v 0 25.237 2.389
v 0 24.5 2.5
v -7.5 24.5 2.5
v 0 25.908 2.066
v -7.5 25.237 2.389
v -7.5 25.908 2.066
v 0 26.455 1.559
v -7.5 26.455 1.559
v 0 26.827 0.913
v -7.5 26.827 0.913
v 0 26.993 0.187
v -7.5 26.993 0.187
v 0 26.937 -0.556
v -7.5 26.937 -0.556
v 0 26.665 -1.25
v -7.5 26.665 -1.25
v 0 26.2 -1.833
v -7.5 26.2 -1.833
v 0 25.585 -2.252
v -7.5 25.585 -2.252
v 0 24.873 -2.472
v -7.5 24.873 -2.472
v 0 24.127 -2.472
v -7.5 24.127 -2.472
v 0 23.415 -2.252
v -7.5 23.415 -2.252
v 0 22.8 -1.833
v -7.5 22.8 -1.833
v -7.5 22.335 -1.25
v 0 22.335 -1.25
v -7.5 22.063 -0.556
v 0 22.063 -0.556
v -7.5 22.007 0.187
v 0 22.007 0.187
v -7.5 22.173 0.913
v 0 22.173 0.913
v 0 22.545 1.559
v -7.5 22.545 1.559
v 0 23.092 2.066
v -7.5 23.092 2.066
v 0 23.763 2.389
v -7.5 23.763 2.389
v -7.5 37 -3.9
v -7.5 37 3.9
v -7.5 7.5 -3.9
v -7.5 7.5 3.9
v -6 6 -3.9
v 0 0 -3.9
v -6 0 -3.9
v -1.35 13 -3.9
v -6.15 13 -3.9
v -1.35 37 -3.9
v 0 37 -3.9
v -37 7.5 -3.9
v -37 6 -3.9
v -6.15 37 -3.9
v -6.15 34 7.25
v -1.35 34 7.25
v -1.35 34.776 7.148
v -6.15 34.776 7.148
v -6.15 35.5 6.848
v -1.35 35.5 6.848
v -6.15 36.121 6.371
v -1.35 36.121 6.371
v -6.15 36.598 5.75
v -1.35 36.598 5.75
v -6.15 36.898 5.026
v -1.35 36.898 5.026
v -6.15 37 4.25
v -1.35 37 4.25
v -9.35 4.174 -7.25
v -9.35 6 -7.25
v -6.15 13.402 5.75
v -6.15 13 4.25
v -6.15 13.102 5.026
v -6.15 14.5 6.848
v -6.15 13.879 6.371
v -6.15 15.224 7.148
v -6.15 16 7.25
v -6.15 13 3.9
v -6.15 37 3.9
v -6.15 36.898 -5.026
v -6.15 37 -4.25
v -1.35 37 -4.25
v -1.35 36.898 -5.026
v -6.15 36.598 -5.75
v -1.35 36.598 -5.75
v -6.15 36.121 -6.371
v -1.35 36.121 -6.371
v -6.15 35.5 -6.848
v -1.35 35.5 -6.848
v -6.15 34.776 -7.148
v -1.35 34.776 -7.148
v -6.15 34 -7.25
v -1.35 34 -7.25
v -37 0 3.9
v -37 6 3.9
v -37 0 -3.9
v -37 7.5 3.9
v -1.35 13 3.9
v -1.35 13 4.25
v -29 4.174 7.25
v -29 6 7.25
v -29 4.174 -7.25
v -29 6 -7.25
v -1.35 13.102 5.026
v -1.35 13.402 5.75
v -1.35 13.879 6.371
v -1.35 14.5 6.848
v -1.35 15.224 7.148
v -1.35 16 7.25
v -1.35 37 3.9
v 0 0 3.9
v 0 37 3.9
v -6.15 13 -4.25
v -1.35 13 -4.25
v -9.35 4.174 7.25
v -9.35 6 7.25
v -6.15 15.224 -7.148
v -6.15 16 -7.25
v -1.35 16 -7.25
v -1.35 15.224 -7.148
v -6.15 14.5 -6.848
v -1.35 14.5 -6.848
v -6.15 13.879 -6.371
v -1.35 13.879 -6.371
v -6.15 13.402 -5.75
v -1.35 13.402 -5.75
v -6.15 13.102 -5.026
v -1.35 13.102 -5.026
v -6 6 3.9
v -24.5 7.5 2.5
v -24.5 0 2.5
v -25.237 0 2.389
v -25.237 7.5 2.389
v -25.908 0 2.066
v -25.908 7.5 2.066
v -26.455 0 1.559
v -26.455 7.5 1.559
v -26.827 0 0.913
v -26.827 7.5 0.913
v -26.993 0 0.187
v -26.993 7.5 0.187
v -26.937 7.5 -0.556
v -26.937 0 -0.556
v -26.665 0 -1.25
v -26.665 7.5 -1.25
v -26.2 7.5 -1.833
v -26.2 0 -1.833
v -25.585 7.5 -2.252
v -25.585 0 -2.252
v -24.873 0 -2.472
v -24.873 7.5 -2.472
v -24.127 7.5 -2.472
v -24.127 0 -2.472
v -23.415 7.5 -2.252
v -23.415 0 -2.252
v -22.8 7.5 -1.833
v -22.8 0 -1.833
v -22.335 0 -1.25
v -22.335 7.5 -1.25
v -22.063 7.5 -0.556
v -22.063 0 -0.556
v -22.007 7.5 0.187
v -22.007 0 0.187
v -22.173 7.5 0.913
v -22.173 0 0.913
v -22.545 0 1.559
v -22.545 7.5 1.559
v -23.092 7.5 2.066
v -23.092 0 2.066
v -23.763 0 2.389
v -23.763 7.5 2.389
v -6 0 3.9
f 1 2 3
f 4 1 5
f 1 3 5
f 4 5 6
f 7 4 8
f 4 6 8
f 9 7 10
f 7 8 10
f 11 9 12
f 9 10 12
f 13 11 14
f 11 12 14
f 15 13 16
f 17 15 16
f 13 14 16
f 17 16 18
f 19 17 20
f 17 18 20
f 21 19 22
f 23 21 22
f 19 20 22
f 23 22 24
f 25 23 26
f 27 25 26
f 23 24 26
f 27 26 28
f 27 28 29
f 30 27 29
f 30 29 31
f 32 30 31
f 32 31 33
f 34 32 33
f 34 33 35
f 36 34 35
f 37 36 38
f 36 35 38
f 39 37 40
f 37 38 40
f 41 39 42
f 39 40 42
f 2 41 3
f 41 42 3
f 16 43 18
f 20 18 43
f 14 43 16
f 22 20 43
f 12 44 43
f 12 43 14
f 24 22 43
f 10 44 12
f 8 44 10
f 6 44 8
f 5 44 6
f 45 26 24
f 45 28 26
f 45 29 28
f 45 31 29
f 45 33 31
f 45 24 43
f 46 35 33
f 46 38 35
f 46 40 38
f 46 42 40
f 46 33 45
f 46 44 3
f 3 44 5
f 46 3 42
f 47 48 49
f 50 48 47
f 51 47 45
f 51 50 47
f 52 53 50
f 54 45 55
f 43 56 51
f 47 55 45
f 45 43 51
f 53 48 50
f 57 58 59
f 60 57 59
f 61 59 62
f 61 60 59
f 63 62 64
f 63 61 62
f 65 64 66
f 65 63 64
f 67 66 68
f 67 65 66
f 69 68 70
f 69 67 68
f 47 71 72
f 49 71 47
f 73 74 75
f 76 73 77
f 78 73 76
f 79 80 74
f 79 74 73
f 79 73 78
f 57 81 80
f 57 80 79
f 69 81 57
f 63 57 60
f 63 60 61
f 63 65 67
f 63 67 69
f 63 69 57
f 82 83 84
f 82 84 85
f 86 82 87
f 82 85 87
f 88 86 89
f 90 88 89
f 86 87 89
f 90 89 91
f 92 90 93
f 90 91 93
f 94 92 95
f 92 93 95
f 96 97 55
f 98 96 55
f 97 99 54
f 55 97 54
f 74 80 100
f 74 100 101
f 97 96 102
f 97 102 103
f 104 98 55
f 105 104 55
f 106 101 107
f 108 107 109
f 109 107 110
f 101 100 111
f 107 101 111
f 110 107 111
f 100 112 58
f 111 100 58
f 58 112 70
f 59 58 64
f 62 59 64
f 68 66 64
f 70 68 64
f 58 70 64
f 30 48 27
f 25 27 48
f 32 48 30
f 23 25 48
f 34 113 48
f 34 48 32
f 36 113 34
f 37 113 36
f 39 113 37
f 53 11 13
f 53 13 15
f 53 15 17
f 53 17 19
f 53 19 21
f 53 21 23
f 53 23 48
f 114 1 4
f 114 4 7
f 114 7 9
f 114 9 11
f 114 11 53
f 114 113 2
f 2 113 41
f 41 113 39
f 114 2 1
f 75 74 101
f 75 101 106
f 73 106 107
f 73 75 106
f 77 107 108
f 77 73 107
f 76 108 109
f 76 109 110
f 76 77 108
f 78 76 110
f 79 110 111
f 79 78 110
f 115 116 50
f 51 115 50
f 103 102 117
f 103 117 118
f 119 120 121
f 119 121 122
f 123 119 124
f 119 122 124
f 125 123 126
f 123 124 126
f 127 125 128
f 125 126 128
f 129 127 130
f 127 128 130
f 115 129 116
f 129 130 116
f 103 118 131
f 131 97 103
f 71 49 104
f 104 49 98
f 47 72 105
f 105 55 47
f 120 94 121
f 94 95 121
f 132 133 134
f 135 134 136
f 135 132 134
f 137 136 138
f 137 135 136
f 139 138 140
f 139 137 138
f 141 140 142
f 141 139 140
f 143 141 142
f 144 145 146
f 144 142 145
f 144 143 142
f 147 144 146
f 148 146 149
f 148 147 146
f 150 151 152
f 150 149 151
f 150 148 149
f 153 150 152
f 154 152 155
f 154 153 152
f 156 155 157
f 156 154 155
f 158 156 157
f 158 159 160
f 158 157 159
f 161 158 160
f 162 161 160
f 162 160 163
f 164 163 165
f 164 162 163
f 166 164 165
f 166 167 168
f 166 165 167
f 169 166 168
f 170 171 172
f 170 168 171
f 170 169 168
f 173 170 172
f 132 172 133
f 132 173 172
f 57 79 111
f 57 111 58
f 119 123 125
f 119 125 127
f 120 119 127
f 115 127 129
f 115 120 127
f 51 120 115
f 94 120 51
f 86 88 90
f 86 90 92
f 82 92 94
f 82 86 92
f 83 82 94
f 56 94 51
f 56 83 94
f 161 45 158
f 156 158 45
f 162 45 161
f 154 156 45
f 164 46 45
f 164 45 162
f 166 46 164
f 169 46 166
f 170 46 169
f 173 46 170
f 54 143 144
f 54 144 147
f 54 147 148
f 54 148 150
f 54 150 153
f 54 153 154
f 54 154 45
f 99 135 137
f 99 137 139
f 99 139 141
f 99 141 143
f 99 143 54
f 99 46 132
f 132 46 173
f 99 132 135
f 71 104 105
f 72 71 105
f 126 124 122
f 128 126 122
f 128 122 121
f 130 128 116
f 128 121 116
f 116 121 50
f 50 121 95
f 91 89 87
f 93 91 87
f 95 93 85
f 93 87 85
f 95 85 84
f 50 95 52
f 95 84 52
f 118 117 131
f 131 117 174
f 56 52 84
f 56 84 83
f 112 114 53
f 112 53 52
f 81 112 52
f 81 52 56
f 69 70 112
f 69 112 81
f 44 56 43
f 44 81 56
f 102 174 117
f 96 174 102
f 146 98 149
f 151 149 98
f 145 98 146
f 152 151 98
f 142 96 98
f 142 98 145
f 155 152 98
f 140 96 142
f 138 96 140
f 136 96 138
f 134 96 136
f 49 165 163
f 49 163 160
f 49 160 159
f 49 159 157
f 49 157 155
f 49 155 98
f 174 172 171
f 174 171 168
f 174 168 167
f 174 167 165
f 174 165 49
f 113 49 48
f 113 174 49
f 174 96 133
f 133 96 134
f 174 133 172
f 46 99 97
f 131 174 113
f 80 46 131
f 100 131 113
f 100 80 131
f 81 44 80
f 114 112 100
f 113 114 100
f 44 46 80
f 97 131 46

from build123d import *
from OCP.BRepFilletAPI import BRepFilletAPI_MakeChamfer

# Parameters (mm, degrees)
EXTRUDE_1_DEPTH = 3.9
EXTRUDE_2_DEPTH = 35.65
CHAMFER_1_SIZE  = 8
CHAMFER_1_SIZE2 = 3.35
CHAMFER_2_SIZE  = 8
EXTRUDE_3_DEPTH = 2.4


with BuildPart() as part:
    # 草图1 → 凸台-拉伸1 (new, symmetric)
    with BuildSketch(Plane.XY):
        Polygon((-37, 0), (0, 0), (0, 37), (-7.5, 37), (-7.5, 7.5), (-37, 7.5), align=None)
    extrude(amount=EXTRUDE_1_DEPTH, both=True)

    # 草图3 → 凸台-拉伸2 (add)
    with BuildSketch(Plane.ZY.offset(37)):
        Polygon((-3.9, 0), (-7.25, 4.174374383), (-7.25, 6), (-3.9, 6), align=None)
        Polygon((3.9, 6), (3.9, 0), (7.25, 4.174374383), (7.25, 6), align=None)
    extrude(amount=-EXTRUDE_2_DEPTH)

    # 倒角1: one chamfer whose edges measure the first distance from different faces: ONE call of the kernel's chamfer builder (chamfer() names one face for all edges)
    chamfer_1_edges_1 = [part.edges().sort_by_distance(p)[0] for p in [
        (-37, 5.087187192, -7.25),
    ]]
    chamfer_1_side_1 = [part.faces().sort_by_distance(p)[0] for p in [
        (-19.175, 5.087187192, -7.25),
    ]]
    chamfer_1_edges_2 = [part.edges().sort_by_distance(p)[0] for p in [
        (-37, 5.087187192, 7.25),
    ]]
    chamfer_1_side_2 = [part.faces().sort_by_distance(p)[0] for p in [
        (-19.175, 5.087187192, 7.25),
    ]]
    chamfer_1 = BRepFilletAPI_MakeChamfer(part.part.solid().wrapped)
    for e in chamfer_1_edges_1:
        chamfer_1.Add(CHAMFER_1_SIZE, CHAMFER_1_SIZE2, e.wrapped, chamfer_1_side_1[0].wrapped)  # the first distance lies on this face
    for e in chamfer_1_edges_2:
        chamfer_1.Add(CHAMFER_1_SIZE, CHAMFER_1_SIZE2, e.wrapped, chamfer_1_side_2[0].wrapped)  # the first distance lies on this face
    add(Compound.cast(chamfer_1.Shape()), mode=Mode.REPLACE)

    # 倒角2
    # the kernel refuses this chamfer: 8 mm, written as the material it takes off along each edge
    with BuildSketch(Plane(origin=(-1.35, -16.39908952, 7.25), x_dir=(-0.9996219169112968, 0, 0.027495876610586382), z_dir=(0, 1, 0))) as chamfer_2_piece_1_section:
        Polygon((CHAMFER_2_SIZE * 0.999621916911, -CHAMFER_2_SIZE * 0.0274958766106), (-CHAMFER_2_SIZE * 0.0274958766106, -CHAMFER_2_SIZE * 0.999621916911), (0, 0), align=None)
    chamfer_2_piece_1 = extrude(amount=42.972553424, mode=Mode.PRIVATE)
    chamfer_2_piece_1 = split(chamfer_2_piece_1, bisect_by=Plane(origin=(-4.629145345, 5.087187192, 3.9), z_dir=(0, 0, 1)), keep=Keep.TOP, mode=Mode.PRIVATE)
    add(chamfer_2_piece_1, mode=Mode.SUBTRACT)
    with BuildSketch(Plane(origin=(-1.35, -16.39908952, -7.25), x_dir=(-0.9996219169112968, 0, -0.027495876610586382), z_dir=(0, 1, 0))) as chamfer_2_piece_2_section:
        Polygon((CHAMFER_2_SIZE * 0.999621916911, CHAMFER_2_SIZE * 0.0274958766106), (-CHAMFER_2_SIZE * 0.0274958766106, CHAMFER_2_SIZE * 0.999621916911), (0, 0), align=None)
    chamfer_2_piece_2 = extrude(amount=42.972553424, mode=Mode.PRIVATE)
    chamfer_2_piece_2 = split(chamfer_2_piece_2, bisect_by=Plane(origin=(-4.629145345, 5.087187192, -3.9), z_dir=(0, 0, -1)), keep=Keep.TOP, mode=Mode.PRIVATE)
    add(chamfer_2_piece_2, mode=Mode.SUBTRACT)

    # 草图4 → 凸台-拉伸3 (add, symmetric)
    with BuildSketch(Plane.ZY.offset(3.75)):
        with BuildLine():
            Line((-3.9, 37), (-4.25, 37))
            ThreePointArc((-4.25, 37), (-6.371320344, 36.121320344), (-7.25, 34))
            Line((-7.25, 34), (-7.25, 16))
            ThreePointArc((-7.25, 16), (-6.371320344, 13.878679656), (-4.25, 13))
            Line((-4.25, 13), (-3.9, 13))
            Line((-3.9, 13), (-3.9, 37))
        make_face()
        with BuildLine():
            Line((3.9, 37), (3.9, 13))
            Line((3.9, 13), (4.25, 13))
            ThreePointArc((4.25, 13), (6.371320344, 13.878679656), (7.25, 16))
            Line((7.25, 16), (7.25, 34))
            ThreePointArc((7.25, 34), (6.371320344, 36.121320344), (4.25, 37))
            Line((4.25, 37), (3.9, 37))
        make_face()
    extrude(amount=EXTRUDE_3_DEPTH, both=True)

    # 草图6 → M6 螺纹孔1 (revolve, cut)
    with BuildSketch(Plane(origin=(-24.5, 7.5, 0), x_dir=(0, 0, 1), z_dir=(1, 0, 0))):
        Polygon((0, 0), (0, 29.502151548), (2.5, 28), (2.5, 0), align=None)
    hole_wizard_m6_1 = revolve(axis=Axis((-24.5, 13.85, 0), (0, -1, 0)), mode=Mode.SUBTRACT)

    # 镜向1: M6 螺纹孔1 across plane
    add(hole_wizard_m6_1.mirror(Plane(origin=(0, 0, 0), x_dir=(0, 0, 1), z_dir=(-0.7071067811865477, -0.7071067811865475, 0))), mode=Mode.SUBTRACT)


solid = part.part
